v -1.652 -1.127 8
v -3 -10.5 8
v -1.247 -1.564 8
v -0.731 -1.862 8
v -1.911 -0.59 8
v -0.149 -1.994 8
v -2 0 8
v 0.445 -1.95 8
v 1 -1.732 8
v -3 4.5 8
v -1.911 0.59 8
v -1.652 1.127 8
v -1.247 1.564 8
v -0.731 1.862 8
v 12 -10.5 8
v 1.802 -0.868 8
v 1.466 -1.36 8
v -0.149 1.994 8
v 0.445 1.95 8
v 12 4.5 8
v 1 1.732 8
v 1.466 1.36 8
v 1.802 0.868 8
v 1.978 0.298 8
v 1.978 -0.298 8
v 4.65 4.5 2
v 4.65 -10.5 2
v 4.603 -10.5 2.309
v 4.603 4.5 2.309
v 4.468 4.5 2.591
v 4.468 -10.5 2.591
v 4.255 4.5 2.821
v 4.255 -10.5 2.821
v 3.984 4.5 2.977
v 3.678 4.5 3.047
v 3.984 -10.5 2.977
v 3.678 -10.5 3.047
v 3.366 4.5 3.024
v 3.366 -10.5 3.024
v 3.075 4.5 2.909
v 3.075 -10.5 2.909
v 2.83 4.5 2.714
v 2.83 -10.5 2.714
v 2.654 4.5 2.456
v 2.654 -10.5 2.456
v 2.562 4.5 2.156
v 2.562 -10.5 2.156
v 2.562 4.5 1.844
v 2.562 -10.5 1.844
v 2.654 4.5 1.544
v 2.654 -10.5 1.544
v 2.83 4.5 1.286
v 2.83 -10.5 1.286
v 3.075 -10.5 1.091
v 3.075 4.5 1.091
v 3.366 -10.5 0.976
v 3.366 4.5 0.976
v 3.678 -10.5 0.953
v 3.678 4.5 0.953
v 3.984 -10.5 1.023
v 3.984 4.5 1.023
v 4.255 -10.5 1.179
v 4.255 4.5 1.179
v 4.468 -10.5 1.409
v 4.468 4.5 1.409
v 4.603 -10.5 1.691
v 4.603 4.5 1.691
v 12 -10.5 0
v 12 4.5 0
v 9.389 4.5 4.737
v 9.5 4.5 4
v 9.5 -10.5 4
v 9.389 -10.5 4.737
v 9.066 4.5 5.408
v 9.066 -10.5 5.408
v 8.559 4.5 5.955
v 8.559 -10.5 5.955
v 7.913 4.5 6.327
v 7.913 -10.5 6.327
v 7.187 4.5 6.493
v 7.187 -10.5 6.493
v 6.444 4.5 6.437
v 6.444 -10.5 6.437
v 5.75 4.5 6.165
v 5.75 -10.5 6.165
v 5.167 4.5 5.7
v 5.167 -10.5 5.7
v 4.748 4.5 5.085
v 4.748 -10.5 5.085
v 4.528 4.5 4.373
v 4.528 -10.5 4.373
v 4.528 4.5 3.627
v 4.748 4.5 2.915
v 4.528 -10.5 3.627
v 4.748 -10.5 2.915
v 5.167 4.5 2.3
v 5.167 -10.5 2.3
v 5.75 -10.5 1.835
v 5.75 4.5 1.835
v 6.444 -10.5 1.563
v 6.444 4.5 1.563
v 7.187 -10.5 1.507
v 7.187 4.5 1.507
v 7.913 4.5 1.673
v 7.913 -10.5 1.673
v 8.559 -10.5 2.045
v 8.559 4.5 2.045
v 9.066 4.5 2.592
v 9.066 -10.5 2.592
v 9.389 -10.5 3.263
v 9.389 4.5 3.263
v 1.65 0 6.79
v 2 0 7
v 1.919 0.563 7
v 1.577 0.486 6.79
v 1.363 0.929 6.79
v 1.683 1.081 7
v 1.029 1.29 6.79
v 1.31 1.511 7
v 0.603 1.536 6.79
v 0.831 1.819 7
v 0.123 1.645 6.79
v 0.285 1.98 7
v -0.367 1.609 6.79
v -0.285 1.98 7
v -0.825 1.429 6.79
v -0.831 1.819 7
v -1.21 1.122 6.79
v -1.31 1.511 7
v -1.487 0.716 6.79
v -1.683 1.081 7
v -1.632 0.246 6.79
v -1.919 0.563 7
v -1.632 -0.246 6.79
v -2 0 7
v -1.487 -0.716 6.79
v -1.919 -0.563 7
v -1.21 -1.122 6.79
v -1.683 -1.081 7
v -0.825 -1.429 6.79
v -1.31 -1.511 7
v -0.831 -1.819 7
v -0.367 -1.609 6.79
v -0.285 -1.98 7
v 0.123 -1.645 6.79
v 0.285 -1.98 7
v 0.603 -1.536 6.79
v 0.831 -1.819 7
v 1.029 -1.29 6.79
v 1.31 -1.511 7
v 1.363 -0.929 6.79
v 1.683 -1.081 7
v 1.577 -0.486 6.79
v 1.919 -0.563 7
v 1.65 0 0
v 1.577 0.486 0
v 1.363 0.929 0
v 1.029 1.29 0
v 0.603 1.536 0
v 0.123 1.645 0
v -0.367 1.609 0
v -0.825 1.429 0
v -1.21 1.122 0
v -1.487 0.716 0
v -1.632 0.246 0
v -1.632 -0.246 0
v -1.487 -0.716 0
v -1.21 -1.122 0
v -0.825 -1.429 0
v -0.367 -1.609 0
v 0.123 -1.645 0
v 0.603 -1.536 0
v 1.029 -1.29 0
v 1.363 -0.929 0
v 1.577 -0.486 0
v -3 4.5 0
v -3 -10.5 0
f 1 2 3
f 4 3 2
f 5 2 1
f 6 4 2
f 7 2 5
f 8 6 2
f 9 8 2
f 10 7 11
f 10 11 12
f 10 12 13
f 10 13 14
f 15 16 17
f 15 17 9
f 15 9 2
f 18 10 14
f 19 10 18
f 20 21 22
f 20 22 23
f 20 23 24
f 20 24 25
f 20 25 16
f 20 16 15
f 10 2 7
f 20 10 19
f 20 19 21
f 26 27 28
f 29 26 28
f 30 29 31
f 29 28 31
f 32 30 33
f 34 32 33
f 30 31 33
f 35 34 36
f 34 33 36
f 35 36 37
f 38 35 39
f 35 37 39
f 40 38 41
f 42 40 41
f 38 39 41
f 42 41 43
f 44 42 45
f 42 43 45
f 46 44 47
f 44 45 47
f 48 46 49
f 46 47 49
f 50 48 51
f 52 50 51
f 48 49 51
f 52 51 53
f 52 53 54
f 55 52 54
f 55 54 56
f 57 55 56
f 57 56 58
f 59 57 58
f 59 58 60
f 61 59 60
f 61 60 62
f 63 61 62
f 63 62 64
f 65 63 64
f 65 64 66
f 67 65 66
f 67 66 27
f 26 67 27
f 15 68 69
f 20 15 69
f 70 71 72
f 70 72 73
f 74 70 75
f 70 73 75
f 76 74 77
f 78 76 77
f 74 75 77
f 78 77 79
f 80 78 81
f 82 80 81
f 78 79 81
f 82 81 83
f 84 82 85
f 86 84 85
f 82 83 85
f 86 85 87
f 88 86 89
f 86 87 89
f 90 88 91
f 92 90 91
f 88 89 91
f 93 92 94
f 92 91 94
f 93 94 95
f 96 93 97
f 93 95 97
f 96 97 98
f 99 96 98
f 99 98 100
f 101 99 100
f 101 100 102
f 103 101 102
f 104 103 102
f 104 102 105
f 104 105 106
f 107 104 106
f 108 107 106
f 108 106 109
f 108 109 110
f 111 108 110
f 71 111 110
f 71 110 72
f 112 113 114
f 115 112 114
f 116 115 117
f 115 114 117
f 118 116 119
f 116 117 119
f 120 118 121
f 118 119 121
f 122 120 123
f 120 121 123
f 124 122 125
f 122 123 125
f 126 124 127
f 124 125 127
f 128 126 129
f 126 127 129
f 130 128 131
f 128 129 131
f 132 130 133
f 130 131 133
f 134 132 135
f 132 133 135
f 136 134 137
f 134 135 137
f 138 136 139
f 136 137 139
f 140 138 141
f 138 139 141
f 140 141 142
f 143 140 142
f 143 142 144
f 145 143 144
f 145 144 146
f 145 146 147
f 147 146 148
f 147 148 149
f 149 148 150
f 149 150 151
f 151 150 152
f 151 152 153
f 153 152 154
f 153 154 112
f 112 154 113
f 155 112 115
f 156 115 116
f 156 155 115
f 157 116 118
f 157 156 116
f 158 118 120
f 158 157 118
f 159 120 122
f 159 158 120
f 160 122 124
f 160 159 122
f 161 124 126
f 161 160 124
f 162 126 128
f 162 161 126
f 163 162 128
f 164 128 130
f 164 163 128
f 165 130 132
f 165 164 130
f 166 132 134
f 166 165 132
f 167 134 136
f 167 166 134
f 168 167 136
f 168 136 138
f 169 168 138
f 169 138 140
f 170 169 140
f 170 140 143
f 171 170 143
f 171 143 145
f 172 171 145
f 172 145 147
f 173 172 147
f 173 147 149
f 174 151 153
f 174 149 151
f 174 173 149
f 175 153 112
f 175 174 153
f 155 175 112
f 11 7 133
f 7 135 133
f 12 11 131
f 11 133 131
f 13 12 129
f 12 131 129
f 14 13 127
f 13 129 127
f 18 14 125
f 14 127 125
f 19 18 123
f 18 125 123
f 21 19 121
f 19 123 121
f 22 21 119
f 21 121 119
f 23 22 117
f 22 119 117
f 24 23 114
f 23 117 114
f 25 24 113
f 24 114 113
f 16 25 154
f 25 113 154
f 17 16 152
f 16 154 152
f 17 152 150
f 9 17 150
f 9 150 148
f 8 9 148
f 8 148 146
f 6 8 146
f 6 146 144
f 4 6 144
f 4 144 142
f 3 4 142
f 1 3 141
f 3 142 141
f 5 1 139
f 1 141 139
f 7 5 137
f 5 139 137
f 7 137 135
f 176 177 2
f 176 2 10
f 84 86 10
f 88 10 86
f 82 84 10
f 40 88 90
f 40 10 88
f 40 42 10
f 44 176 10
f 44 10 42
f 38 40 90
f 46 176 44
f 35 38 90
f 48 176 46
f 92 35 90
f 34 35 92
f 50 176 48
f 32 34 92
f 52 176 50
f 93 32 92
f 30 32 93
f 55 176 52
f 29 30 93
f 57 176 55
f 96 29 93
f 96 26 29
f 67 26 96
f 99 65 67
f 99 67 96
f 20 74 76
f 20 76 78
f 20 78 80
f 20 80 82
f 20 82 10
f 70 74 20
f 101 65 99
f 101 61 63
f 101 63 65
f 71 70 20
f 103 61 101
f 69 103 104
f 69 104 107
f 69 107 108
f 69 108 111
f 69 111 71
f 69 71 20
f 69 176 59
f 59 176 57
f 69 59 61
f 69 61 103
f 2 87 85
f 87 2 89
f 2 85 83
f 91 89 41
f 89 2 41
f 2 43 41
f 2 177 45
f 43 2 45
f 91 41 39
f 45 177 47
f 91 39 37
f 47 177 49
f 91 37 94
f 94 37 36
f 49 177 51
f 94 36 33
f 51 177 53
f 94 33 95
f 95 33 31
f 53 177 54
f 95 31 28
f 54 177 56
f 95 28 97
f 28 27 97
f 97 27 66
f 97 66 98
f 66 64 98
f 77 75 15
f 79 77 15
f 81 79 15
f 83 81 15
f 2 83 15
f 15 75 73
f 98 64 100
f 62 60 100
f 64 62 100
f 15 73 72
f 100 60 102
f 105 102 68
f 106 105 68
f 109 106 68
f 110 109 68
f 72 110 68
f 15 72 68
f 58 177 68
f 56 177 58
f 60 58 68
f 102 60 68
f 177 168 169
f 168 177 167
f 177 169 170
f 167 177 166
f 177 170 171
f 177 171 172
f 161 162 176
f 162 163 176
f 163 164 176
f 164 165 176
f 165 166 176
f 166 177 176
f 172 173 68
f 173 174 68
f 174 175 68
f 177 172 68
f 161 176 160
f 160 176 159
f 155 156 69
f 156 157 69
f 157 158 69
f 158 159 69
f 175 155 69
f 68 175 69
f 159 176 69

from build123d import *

# Parameters (mm, degrees)
SKETCH1_W                    = 15
SKETCH1_H                    = 15
SKETCH1_R                    = 1.65
BOSS_EXTRUDE1_DEPTH          = 8
SKETCH2_R                    = 2.5
CUT_EXTRUDE1_DEPTH           = 16
SKETCH3_R                    = 1.05
CUT_EXTRUDE2_DEPTH           = 16
F_4_0_4_DIAMETER_HOLE1_D     = 4
F_4_0_4_DIAMETER_HOLE1_DEPTH = 1
F_4_0_4_DIAMETER_HOLE1_TIP   = 1.201721238


with BuildPart() as part:
    # Sketch1 → Boss-Extrude1 (new body)
    with BuildSketch(Plane.XY):
        with Locations((4.5, -3)):
            Rectangle(SKETCH1_W, SKETCH1_H)
        Circle(SKETCH1_R, mode=Mode.SUBTRACT)
    extrude(amount=BOSS_EXTRUDE1_DEPTH)

    # Sketch2 → Cut-Extrude1 (cut, through all)
    with BuildSketch(Plane.XZ.offset(10.5)):
        with Locations((7, 4)):
            Circle(SKETCH2_R)
    extrude(amount=-CUT_EXTRUDE1_DEPTH, mode=Mode.SUBTRACT)

    # Sketch3 → Cut-Extrude2 (cut, through all)
    with BuildSketch(Plane.XZ.offset(10.5)):
        with Locations((3.6, 2)):
            Circle(SKETCH3_R)
    extrude(amount=-CUT_EXTRUDE2_DEPTH, mode=Mode.SUBTRACT)

    # Ø4.0 (4) Diameter Hole1
    with Locations(Plane.XY.offset(8)):
        with Locations((0, 0)):
            Hole(F_4_0_4_DIAMETER_HOLE1_D / 2, depth=F_4_0_4_DIAMETER_HOLE1_DEPTH)
            with Locations((0, 0, -(F_4_0_4_DIAMETER_HOLE1_DEPTH + F_4_0_4_DIAMETER_HOLE1_TIP / 2))):  # 118° drill point
                Cone(0, F_4_0_4_DIAMETER_HOLE1_D / 2, F_4_0_4_DIAMETER_HOLE1_TIP, mode=Mode.SUBTRACT)


solid = part.part
